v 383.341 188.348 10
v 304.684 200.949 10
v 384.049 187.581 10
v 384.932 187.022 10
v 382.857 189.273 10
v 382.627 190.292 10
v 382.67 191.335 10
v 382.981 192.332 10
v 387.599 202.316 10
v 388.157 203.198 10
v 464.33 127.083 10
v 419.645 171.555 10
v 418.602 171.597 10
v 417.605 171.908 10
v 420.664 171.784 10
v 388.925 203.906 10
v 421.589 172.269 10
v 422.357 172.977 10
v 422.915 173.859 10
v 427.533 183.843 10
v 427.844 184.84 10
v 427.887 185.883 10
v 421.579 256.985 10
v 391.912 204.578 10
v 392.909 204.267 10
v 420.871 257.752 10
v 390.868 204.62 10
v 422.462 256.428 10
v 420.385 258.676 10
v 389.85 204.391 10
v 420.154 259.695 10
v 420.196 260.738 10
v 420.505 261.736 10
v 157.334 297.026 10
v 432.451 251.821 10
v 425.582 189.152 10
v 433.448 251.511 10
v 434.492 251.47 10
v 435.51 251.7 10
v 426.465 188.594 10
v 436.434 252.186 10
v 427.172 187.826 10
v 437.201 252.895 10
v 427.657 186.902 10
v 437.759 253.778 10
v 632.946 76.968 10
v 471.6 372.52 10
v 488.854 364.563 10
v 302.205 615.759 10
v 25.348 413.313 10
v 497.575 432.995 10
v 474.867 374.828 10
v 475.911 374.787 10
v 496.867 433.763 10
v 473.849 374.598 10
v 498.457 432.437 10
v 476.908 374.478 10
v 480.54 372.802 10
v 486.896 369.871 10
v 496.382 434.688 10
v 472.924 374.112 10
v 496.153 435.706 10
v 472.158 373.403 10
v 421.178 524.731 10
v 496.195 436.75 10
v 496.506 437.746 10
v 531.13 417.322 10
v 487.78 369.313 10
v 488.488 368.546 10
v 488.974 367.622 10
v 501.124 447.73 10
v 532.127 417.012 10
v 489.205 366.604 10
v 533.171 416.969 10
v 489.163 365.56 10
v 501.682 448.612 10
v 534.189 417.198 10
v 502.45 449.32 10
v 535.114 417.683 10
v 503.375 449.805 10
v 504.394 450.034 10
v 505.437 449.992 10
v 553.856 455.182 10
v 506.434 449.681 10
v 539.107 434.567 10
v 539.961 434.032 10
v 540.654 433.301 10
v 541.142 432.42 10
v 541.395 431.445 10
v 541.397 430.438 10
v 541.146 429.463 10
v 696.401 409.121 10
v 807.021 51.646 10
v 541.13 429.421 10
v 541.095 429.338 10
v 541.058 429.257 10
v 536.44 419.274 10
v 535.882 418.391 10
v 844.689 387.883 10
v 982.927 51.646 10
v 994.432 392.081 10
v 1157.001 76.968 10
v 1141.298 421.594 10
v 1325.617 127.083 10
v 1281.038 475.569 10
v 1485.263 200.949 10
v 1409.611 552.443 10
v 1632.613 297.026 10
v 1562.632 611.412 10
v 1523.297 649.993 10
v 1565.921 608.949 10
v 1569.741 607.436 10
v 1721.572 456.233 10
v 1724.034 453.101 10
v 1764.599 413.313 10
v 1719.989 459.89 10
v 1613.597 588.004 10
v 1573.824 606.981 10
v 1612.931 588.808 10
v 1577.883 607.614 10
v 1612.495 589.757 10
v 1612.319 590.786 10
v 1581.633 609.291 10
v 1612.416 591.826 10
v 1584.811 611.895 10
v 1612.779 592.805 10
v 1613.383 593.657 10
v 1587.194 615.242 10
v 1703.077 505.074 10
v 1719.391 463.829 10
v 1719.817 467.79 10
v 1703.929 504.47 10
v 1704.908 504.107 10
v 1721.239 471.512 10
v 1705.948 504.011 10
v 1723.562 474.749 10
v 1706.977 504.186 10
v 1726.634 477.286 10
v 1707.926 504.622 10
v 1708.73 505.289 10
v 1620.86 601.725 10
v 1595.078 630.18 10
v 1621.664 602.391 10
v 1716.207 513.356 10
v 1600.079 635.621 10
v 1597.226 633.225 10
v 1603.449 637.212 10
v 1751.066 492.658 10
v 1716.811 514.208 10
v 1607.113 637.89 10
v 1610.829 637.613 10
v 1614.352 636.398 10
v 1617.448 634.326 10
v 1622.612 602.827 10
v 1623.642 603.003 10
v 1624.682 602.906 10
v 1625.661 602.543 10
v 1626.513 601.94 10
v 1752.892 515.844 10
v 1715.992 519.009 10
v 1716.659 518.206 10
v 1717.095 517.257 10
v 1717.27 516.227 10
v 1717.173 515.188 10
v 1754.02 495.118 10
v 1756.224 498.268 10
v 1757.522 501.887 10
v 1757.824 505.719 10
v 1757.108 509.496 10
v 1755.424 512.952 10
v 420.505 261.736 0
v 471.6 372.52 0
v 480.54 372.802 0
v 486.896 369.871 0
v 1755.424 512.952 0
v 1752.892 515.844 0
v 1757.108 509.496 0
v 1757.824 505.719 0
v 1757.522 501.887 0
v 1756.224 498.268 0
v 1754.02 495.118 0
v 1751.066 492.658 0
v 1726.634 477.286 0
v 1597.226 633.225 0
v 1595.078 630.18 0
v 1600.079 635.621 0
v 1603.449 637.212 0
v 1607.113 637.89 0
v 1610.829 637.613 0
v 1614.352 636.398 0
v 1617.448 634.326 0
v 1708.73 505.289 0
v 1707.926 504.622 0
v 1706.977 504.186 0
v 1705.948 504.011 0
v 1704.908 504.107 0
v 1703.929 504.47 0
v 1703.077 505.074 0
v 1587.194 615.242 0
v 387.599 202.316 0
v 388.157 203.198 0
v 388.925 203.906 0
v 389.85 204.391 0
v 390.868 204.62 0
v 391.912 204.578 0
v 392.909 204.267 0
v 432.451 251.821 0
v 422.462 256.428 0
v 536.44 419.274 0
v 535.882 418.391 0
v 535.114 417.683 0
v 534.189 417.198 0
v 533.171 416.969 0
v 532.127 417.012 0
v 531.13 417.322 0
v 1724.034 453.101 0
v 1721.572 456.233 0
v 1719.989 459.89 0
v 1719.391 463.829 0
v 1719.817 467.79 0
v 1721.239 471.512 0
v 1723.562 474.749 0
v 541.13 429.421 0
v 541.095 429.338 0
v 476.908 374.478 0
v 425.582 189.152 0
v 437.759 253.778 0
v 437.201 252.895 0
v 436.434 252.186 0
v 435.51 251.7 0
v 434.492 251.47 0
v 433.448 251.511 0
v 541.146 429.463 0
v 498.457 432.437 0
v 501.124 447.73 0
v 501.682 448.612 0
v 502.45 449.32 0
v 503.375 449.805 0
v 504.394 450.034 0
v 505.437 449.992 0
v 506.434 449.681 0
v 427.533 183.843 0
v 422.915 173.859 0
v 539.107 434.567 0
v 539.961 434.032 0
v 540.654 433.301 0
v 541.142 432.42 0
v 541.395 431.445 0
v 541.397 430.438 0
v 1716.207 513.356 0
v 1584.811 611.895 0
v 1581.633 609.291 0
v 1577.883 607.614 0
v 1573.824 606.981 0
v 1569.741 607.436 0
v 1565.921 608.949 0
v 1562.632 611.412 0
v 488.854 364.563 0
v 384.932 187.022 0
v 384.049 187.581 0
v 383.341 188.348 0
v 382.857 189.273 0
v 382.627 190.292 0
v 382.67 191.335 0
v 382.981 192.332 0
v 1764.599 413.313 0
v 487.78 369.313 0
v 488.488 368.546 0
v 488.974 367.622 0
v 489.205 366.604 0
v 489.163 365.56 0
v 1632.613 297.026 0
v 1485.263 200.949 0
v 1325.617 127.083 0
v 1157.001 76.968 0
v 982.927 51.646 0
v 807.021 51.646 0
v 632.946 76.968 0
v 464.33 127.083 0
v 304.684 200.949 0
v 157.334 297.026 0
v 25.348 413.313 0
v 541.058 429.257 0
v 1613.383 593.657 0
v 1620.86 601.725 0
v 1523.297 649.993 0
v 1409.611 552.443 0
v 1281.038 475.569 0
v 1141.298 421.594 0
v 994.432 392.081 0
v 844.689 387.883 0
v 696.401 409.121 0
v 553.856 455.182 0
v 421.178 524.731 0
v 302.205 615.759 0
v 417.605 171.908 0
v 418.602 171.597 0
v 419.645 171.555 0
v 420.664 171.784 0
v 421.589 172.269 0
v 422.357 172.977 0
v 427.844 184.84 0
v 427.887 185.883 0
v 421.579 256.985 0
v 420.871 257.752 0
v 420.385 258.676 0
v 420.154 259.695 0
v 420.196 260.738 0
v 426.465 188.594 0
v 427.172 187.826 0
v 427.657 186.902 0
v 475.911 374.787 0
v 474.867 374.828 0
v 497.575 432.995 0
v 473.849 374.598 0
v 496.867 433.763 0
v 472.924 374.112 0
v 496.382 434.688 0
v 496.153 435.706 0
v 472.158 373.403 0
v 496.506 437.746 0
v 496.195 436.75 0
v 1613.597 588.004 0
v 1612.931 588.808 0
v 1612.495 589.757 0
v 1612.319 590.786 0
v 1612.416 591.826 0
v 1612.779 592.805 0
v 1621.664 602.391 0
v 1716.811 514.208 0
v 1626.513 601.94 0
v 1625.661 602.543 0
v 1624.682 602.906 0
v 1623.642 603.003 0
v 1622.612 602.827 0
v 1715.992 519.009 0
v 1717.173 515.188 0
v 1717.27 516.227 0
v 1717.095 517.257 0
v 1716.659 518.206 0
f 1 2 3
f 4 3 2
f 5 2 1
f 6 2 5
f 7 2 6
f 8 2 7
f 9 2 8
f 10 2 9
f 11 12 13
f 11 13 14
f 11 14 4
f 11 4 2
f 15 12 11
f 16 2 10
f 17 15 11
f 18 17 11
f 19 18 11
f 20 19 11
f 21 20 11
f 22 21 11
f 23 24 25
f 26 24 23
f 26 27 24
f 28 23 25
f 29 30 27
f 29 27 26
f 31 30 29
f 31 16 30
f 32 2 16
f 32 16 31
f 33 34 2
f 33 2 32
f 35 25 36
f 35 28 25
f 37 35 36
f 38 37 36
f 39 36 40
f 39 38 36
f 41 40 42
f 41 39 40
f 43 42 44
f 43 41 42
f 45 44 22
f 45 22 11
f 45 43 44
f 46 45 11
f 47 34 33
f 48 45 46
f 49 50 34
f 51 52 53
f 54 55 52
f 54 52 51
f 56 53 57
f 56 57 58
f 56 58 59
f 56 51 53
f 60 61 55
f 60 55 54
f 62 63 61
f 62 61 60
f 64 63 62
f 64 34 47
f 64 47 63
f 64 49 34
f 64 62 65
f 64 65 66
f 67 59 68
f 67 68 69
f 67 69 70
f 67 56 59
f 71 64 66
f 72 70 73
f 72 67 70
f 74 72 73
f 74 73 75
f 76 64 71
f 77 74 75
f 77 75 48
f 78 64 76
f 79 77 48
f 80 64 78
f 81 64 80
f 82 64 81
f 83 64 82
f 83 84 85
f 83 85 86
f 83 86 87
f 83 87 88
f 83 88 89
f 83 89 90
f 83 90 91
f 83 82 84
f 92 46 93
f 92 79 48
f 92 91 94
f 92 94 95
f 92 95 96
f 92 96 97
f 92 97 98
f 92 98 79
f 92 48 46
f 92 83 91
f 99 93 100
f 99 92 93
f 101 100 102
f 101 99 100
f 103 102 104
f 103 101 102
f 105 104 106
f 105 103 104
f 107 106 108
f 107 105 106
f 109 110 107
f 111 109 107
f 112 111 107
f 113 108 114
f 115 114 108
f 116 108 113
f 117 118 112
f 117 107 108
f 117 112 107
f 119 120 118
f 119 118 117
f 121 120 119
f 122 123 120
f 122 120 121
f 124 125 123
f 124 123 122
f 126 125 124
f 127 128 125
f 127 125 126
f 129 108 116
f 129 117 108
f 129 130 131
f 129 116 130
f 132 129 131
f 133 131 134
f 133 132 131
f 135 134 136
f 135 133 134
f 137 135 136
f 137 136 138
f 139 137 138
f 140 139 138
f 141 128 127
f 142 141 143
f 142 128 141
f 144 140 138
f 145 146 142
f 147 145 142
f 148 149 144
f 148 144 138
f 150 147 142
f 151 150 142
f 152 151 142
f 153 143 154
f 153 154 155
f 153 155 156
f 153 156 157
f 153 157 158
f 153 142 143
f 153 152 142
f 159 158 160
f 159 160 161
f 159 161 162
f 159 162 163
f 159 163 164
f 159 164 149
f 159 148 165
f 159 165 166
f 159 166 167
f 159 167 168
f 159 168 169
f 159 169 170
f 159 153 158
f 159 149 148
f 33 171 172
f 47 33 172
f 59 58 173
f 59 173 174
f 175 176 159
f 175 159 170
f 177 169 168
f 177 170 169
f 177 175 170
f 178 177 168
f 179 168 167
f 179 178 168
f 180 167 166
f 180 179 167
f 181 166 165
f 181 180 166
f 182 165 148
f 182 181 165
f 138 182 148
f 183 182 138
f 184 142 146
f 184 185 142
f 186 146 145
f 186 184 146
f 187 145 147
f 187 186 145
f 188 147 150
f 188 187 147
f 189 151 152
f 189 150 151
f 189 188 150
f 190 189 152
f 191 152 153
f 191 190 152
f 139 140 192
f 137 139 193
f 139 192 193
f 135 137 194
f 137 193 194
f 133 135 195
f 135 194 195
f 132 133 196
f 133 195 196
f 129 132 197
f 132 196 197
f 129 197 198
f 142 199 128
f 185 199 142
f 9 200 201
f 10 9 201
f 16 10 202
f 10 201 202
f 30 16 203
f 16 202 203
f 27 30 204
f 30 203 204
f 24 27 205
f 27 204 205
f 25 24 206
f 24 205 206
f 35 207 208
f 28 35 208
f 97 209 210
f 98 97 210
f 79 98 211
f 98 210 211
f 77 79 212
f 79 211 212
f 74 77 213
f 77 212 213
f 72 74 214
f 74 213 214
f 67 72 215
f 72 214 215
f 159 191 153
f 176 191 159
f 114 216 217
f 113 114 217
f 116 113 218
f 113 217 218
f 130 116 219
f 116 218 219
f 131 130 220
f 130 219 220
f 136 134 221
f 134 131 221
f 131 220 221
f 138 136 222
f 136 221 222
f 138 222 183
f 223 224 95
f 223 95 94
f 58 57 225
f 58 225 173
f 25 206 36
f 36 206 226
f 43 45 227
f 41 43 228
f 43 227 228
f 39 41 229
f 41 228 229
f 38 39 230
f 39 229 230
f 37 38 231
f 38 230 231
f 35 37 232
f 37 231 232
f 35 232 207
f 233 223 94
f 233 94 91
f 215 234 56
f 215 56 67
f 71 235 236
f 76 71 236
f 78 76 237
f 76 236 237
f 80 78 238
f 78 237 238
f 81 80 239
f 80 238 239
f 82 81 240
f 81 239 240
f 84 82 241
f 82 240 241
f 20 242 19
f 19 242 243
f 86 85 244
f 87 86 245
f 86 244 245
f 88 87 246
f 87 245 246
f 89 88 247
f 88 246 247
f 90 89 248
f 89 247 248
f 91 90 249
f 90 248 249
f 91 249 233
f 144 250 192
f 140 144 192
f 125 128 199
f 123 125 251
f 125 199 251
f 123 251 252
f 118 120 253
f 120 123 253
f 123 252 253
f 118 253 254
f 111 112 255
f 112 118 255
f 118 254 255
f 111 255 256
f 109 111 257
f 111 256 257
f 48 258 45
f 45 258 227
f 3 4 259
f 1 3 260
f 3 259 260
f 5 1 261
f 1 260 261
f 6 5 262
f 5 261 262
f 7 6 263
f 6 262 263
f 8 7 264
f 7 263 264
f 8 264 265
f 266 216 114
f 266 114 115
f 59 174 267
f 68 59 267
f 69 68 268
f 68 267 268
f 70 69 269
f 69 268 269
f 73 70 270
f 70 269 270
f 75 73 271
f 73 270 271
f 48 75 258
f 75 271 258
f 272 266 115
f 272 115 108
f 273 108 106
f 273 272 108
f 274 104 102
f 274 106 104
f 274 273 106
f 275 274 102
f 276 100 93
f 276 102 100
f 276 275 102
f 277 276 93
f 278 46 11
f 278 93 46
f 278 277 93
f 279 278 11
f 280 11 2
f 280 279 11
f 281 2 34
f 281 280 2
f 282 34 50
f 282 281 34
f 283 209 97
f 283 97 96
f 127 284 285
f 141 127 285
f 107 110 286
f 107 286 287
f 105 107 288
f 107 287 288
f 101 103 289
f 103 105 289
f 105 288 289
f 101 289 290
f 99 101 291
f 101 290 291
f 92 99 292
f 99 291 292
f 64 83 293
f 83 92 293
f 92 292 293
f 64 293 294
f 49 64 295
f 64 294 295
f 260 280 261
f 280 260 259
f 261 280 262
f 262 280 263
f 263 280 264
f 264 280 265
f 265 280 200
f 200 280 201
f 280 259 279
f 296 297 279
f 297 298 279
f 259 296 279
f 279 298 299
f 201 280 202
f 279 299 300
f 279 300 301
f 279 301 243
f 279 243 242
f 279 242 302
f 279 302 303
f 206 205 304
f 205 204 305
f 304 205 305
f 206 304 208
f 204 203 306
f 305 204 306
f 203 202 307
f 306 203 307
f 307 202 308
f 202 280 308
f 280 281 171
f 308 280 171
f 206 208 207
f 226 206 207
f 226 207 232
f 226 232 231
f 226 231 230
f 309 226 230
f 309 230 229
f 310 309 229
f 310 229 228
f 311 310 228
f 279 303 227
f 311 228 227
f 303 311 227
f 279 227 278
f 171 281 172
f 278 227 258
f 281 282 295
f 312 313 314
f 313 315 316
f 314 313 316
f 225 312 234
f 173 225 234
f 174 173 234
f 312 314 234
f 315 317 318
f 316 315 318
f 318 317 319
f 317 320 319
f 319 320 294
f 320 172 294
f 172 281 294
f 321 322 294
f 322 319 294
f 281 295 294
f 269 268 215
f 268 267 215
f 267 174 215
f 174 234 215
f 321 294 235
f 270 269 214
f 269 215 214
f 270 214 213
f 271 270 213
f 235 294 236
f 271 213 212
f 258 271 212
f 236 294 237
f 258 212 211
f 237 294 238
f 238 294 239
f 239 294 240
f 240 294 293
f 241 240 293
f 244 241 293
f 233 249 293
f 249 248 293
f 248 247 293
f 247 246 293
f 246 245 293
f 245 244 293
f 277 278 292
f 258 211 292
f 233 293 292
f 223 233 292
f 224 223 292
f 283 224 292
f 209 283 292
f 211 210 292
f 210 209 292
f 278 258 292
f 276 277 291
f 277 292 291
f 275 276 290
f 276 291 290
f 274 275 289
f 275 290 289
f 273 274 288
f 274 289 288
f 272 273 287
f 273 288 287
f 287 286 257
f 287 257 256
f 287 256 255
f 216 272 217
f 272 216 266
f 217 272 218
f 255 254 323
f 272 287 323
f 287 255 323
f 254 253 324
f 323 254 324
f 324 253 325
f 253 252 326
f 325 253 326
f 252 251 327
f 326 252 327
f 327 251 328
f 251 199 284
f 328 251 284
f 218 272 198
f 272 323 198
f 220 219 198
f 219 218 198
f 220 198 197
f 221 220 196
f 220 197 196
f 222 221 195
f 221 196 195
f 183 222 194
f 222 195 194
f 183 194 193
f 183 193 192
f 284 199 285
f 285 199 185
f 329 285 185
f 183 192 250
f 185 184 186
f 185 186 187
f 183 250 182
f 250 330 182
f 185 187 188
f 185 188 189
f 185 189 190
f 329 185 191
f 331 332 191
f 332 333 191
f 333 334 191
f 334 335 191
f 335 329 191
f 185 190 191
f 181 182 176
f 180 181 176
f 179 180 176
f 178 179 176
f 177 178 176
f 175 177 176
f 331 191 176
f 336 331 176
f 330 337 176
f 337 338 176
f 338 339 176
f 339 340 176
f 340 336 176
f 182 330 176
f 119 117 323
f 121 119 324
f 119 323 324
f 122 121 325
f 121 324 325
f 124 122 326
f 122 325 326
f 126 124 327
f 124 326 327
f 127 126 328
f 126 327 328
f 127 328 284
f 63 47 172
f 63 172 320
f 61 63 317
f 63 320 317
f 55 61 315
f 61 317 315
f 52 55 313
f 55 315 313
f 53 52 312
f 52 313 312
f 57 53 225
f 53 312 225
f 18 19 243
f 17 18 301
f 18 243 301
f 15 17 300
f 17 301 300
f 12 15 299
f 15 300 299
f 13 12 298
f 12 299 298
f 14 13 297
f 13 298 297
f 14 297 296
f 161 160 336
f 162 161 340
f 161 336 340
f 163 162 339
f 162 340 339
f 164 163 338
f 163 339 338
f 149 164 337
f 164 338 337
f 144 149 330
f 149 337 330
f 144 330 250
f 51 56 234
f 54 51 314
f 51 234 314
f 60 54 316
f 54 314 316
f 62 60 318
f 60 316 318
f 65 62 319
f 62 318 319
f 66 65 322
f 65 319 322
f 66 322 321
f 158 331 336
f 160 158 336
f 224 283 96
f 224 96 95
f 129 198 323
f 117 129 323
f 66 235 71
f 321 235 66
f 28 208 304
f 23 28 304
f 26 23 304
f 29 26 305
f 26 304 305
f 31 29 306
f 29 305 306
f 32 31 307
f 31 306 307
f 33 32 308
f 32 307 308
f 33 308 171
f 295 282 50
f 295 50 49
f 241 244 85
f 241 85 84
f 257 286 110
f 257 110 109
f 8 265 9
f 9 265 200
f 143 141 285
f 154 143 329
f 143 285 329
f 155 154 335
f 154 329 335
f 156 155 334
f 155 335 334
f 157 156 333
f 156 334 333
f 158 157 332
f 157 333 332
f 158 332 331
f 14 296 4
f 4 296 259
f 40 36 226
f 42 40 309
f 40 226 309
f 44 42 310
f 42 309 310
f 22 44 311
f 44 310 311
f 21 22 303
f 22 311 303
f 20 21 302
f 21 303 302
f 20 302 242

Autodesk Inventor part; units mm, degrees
ref_plane "YZ Plane" through (0, 0, 0) normal (1, 0, 0) x (0, 1, 0)
ref_plane "XZ Plane" through (0, 0, 0) normal (0, 1, 0) x (-1, 0, 0)
ref_plane "XY Plane" through (0, 0, 0) normal (0, 0, 1) x (1, 0, 0)
sketch "CONTOURS" plane through (0, 0, 0) normal (0, 0, 1) x (1, 0, 0)
  line L0 (1957.6292, 879.0874) -> (1973.7702, 879.0874)
  arc A0 (1973.7702, 871.0874) -> (1973.7702, 879.0874) centre (1973.7702, 875.0874) ccw
  line L1 (2395.2631, 344.4855) -> (2395.2631, 361.2856)
  line L2 (2395.2631, 361.2856) -> (2335.4041, 361.2856)
  arc A1 (2327.4041, 361.2857) -> (2335.4041, 361.2856) centre (2331.4041, 361.2856) ccw
  line L3 (2327.4041, 361.2857) -> (2327.4041, 413.0854)
  arc A2 (2046.6196, 767.5507) -> (2327.4041, 413.0854) centre (2780.5524, 1060.4825) ccw
  arc A3 (2046.6196, 767.5507) -> (2038.9046, 766.0679) centre (2042.9046, 766.0679) ccw
  line L4 (2038.9046, 766.0679) -> (2038.9041, 604.8116)
  line L5 (2038.9041, 604.8116) -> (2060.9041, 604.8116)
  arc A4 (2068.9041, 604.8116) -> (2060.9041, 604.8116) centre (2064.9041, 604.8116) ccw
  line L6 (2068.9041, 604.8116) -> (2068.9041, 585.8116)
  arc A5 (2060.9041, 585.8116) -> (2068.9041, 585.8116) centre (2064.9041, 585.8116) ccw
  line L7 (2060.9041, 585.8116) -> (2037.4041, 585.8116)
  line L8 (2037.4041, 585.8116) -> (1996.4234, 585.8116)
  arc A6 (1988.9234, 587.8213) -> (1996.4234, 585.8116) centre (1996.4234, 600.8116) ccw
  line L9 (1988.9234, 587.8213) -> (1963.7631, 602.3475)
  arc A7 (1963.7631, 602.3475) -> (1957.7631, 598.8834) centre (1961.7631, 598.8834) ccw
  line L10 (1957.7631, 598.8834) -> (1957.7631, 403.7398)
  arc A8 (1957.7631, 403.7398) -> (1963.7631, 400.2757) centre (1961.7631, 403.7398) ccw
  line L11 (1963.7631, 400.2757) -> (1988.9234, 414.802)
  arc A9 (1996.4234, 416.8116) -> (1988.9234, 414.802) centre (1996.4234, 401.8116) ccw
  line L12 (1996.4234, 416.8116) -> (2037.4041, 416.8116)
  line L13 (2037.4041, 416.8116) -> (2060.9041, 416.8116)
  arc A10 (2068.9041, 416.8116) -> (2060.9041, 416.8116) centre (2064.9041, 416.8116) ccw
  line L14 (2068.9041, 416.8116) -> (2068.9041, 397.8116)
  arc A11 (2060.9041, 397.8116) -> (2068.9041, 397.8116) centre (2064.9041, 397.8116) ccw
  line L15 (2060.9041, 397.8116) -> (2038.9041, 397.8116)
  line L16 (2038.9041, 397.8116) -> (2038.9041, 210.8117)
  line L17 (2038.9041, 210.8117) -> (2052.4041, 210.8117)
  arc A12 (2052.4041, 202.8117) -> (2052.4041, 210.8117) centre (2052.4041, 206.8117) ccw
  line L18 (2052.4041, 202.8117) -> (2052.4041, 195.3488)
  arc A13 (2052.4041, 195.3488) -> (2327.4041, 47.9742) centre (2799.5688, 1259.2914) ccw
  arc A14 (2327.4041, 39.9742) -> (2327.4041, 47.9742) centre (2327.4041, 43.9742) ccw
  line L19 (2327.4041, 39.9742) -> (2327.4041, 23.2856)
  line L20 (2327.4041, 23.2856) -> (2395.2631, 23.2856)
  line L21 (2395.2631, 23.2856) -> (2395.2631, 40.0855)
  arc A15 (2395.2631, 48.0855) -> (2395.2631, 40.0855) centre (2395.2631, 44.0855) ccw
  line L22 (2395.2631, 48.0855) -> (2411.4041, 48.0855)
  line L23 (2411.4041, 48.0855) -> (2411.4041, 66.0855)
  line L24 (2411.4041, 66.0855) -> (2403.2631, 66.0855)
  arc A16 (2395.2631, 66.0855) -> (2403.2631, 66.0855) centre (2399.2631, 66.0855) ccw
  line L25 (2395.2631, 66.0855) -> (2395.2631, 132.0783)
  line L26 (2395.2631, 132.0783) -> (2373.2631, 132.0783)
  arc A17 (2365.2631, 132.0783) -> (2373.2631, 132.0783) centre (2369.2631, 132.0783) ccw
  line L27 (2365.2631, 132.0783) -> (2365.2631, 148.6501)
  line L28 (2365.2631, 148.6501) -> (2364.8394, 148.4335)
  line L29 (2364.8394, 148.4335) -> (2364.4234, 148.2026)
  line L30 (2364.4234, 148.2026) -> (2339.2631, 133.6763)
  arc A18 (2331.7631, 138.0065) -> (2339.2631, 133.6763) centre (2336.7631, 138.0065) ccw
  line L31 (2331.7631, 138.0065) -> (2331.7631, 246.5646)
  arc A19 (2339.2631, 250.8947) -> (2331.7631, 246.5646) centre (2336.7631, 246.5646) ccw
  line L32 (2339.2631, 250.8947) -> (2364.4234, 236.3684)
  line L33 (2364.4234, 236.3684) -> (2364.8394, 236.1375)
  line L34 (2364.8394, 236.1375) -> (2365.2631, 235.9209)
  line L35 (2365.2631, 235.9209) -> (2365.2631, 252.4928)
  arc A20 (2373.2631, 252.4928) -> (2365.2631, 252.4928) centre (2369.2631, 252.4928) ccw
  line L36 (2373.2631, 252.4928) -> (2395.2631, 252.4928)
  line L37 (2395.2631, 252.4928) -> (2395.2631, 318.4855)
  arc A21 (2403.2631, 318.4855) -> (2395.2631, 318.4855) centre (2399.2631, 318.4855) ccw
  line L38 (2403.2631, 318.4855) -> (2411.4041, 318.4855)
  line L39 (2411.4041, 318.4855) -> (2411.4041, 336.4855)
  line L40 (2411.4041, 336.4855) -> (2395.2631, 336.4855)
  arc A22 (2395.2631, 344.4855) -> (2395.2631, 336.4855) centre (2395.2631, 340.4855) ccw
  line L41 (1973.7702, 871.0874) -> (1973.7702, 854.2874)
  line L42 (1973.7702, 854.2874) -> (2033.6292, 854.2873)
  line L43 (2041.6292, 854.2873) -> (2041.6292, 802.4876)
  arc A23 (2322.4137, 448.0223) -> (2041.6292, 802.4876) centre (1588.4809, 155.0905) ccw
  arc A24 (2322.4137, 448.0223) -> (2330.1287, 449.505) centre (2326.1287, 449.505) ccw
  line L44 (2330.1287, 449.505) -> (2330.1292, 610.7613)
  line L45 (2330.1292, 610.7613) -> (2308.1292, 610.7613)
  arc A25 (2300.1292, 610.7613) -> (2308.1292, 610.7613) centre (2304.1292, 610.7613) ccw
  line L46 (2300.1292, 610.7613) -> (2300.1292, 629.7613)
  arc A26 (2308.1292, 629.7613) -> (2300.1292, 629.7613) centre (2304.1292, 629.7613) ccw
  line L47 (2308.1292, 629.7613) -> (2331.6292, 629.7613)
  line L48 (2331.6292, 629.7613) -> (2372.6099, 629.7613)
  arc A27 (2380.1099, 627.7517) -> (2372.6099, 629.7613) centre (2372.6099, 614.7613) ccw
  line L49 (2380.1099, 627.7517) -> (2405.2702, 613.2254)
  arc A28 (2405.2702, 613.2254) -> (2411.2702, 616.6895) centre (2407.2702, 616.6895) ccw
  line L50 (2411.2702, 616.6895) -> (2411.2702, 811.8331)
  line L51 (2405.2702, 815.2972) -> (2380.1099, 800.7709)
  arc A29 (2372.6099, 798.7613) -> (2380.1099, 800.7709) centre (2372.6099, 813.7613) ccw
  line L52 (2372.6099, 798.7613) -> (2331.6292, 798.7613)
  line L53 (2331.6292, 798.7613) -> (2308.1292, 798.7613)
  arc A30 (2300.1292, 798.7613) -> (2308.1292, 798.7613) centre (2304.1292, 798.7613) ccw
  line L54 (2300.1292, 798.7613) -> (2300.1292, 817.7613)
  arc A31 (2308.1292, 817.7613) -> (2300.1292, 817.7613) centre (2304.1292, 817.7613) ccw
  line L55 (2308.1292, 817.7613) -> (2330.1292, 817.7613)
  line L56 (2330.1292, 817.7613) -> (2330.1292, 1004.7612)
  line L57 (2330.1292, 1004.7612) -> (2316.6292, 1004.7612)
  arc A32 (2316.6292, 1012.7612) -> (2316.6292, 1004.7612) centre (2316.6292, 1008.7612) ccw
  line L58 (2316.6292, 1012.7612) -> (2316.6292, 1020.2242)
  arc A33 (2316.6292, 1020.2242) -> (2041.6292, 1167.5988) centre (1569.4645, -43.7184) ccw
  arc A34 (2041.6292, 1175.5988) -> (2041.6292, 1167.5988) centre (2041.6292, 1171.5988) ccw
  line L59 (2041.6292, 1175.5988) -> (2041.6292, 1192.2873)
  line L60 (2041.6292, 1192.2873) -> (1973.7702, 1192.2873)
  line L61 (1973.7702, 1192.2873) -> (1973.7702, 1175.4874)
  arc A35 (1973.7702, 1167.4874) -> (1973.7702, 1175.4874) centre (1973.7702, 1171.4874) ccw
  line L62 (1973.7702, 1167.4874) -> (1957.6292, 1167.4874)
  line L63 (1957.6292, 1167.4874) -> (1957.6292, 1149.4874)
  line L64 (1957.6292, 1149.4874) -> (1965.7702, 1149.4874)
  arc A36 (1973.7702, 1149.4874) -> (1965.7702, 1149.4874) centre (1969.7702, 1149.4874) ccw
  line L65 (1973.7702, 1149.4874) -> (1973.7702, 1083.4947)
  line L66 (1973.7702, 1083.4947) -> (1995.7702, 1083.4947)
  arc A37 (2003.7702, 1083.4946) -> (1995.7702, 1083.4947) centre (1999.7702, 1083.4947) ccw
  line L67 (2003.7702, 1083.4946) -> (2003.7702, 1066.9228)
  line L68 (2003.7702, 1066.9228) -> (2004.1939, 1067.1394)
  line L69 (2004.1939, 1067.1394) -> (2004.6099, 1067.3703)
  line L70 (2004.6099, 1067.3703) -> (2029.7702, 1081.8966)
  arc A38 (2037.2702, 1077.5665) -> (2029.7702, 1081.8966) centre (2032.2702, 1077.5665) ccw
  line L71 (2037.2702, 1077.5665) -> (2037.2702, 969.0084)
  line L72 (2029.7702, 964.6782) -> (2004.6099, 979.2045)
  line L73 (2004.6099, 979.2045) -> (2004.1939, 979.4354)
  line L74 (2004.1939, 979.4354) -> (2003.7702, 979.652)
  line L75 (2003.7702, 979.652) -> (2003.7702, 963.0802)
  arc A39 (1995.7702, 963.0802) -> (2003.7702, 963.0802) centre (1999.7702, 963.0802) ccw
  arc A40 (2411.2702, 811.8331) -> (2405.2702, 815.2972) centre (2407.2702, 811.8331) ccw
  line L76 (29.0412, 889.8609) -> (69.6135, 929.6413)
  arc A41 (92.1865, 926.768) -> (69.6135, 929.6413) centre (79.765, 919.2877) ccw
  line L77 (92.1865, 926.768) -> (107.0781, 902.0398)
  arc A42 (107.0781, 902.0398) -> (131.8211, 899.605) centre (120.3563, 910.0361) ccw
  line L78 (131.8211, 899.605) -> (252.9238, 1032.7101)
  arc A43 (252.9238, 1032.7101) -> (248.9601, 1056.7052) centre (241.459, 1043.1412) ccw
  line L79 (248.9601, 1056.7052) -> (234.1791, 1064.8793)
  arc A44 (231.0447, 1087.9218) -> (234.1791, 1064.8793) centre (241.1963, 1077.5683) ccw
  line L80 (231.0447, 1087.9218) -> (270.3869, 1126.4961)
  arc A45 (270.3869, 1126.4961) -> (1527.2637, 1126.4961) centre (898.8253, 1743.5906) ccw
  line L81 (1527.2637, 1126.4961) -> (1815.1018, 939.9773)
  arc A46 (29.0412, 889.8609) -> (1815.1018, 939.9773) centre (898.8169, 1743.6721) ccw
  line L82 (1523.2972, 649.9931) -> (1562.6322, 611.4115)
  arc A47 (1562.6322, 611.4115) -> (1587.1937, 615.2422) centre (1573.4858, 622.4771) ccw
  line L83 (1587.1937, 615.2422) -> (1595.0777, 630.18)
  arc A48 (1617.4481, 634.3255) -> (1595.0777, 630.18) centre (1607.9012, 623.4119) ccw
  line L84 (1617.4481, 634.3255) -> (1752.8919, 515.8444)
  arc A49 (1751.0665, 492.6576) -> (1752.8919, 515.8444) centre (1743.3451, 504.9307) ccw
  line L85 (1751.0665, 492.6576) -> (1726.6337, 477.2861)
  arc A50 (1726.6337, 477.2861) -> (1724.034, 453.1009) centre (1734.8877, 464.1665) ccw
  line L86 (1724.034, 453.1009) -> (1764.599, 413.3129)
  arc A51 (25.3482, 413.3129) -> (1764.599, 413.3129) centre (894.9736, 1267.2896) ccw
  line L87 (25.3482, 413.3129) -> (302.205, 615.759)
  arc A52 (302.205, 615.759) -> (1523.2972, 649.9931) centre (894.9664, 1267.2343) ccw
  line L88 (1995.7702, 963.0802) -> (1973.7702, 963.0802)
  line L89 (1973.7702, 963.0802) -> (1973.7702, 897.0874)
  arc A53 (1965.7702, 897.0874) -> (1973.7702, 897.0874) centre (1969.7702, 897.0874) ccw
  line L90 (1965.7702, 897.0874) -> (1957.6292, 897.0874)
  line L91 (1957.6292, 897.0874) -> (1957.6292, 879.0874)
  dimension "d1" = 338
  dimension "d3" = 16.6885
  dimension "d5" = 18
  dimension "d7" = 16.141
  dimension "d9" = 51.7997
  dimension "d11" = 1300.088
  dimension "d13" = 16.7999
sketch "HOLES" plane through (0, 0, 0) normal (0, 0, 1) x (1, 0, 0)
  line L0 (417.6052, 171.9081) -> (384.9317, 187.0224)
  arc A0 (382.9807, 192.3322) -> (384.9317, 187.0224) centre (386.6111, 190.6528) ccw
  line L1 (382.9807, 192.3322) -> (387.5989, 202.3157)
  arc A1 (392.9087, 204.2668) -> (387.5989, 202.3157) centre (391.2293, 200.6364) ccw
  line L2 (392.9087, 204.2668) -> (425.5822, 189.1525)
  arc A2 (427.5332, 183.8427) -> (425.5822, 189.1525) centre (423.9028, 185.5221) ccw
  line L3 (290.0252, 1067.7256) -> (282.3828, 1059.8139)
  arc A3 (276.7268, 1059.716) -> (282.3828, 1059.8139) centre (279.5059, 1062.593) ccw
  line L4 (276.7268, 1059.716) -> (250.8342, 1084.7274)
  arc A4 (250.7363, 1090.3834) -> (250.8342, 1084.7274) centre (253.6132, 1087.6044) ccw
  line L5 (250.7363, 1090.3834) -> (258.3786, 1098.2951)
  arc A5 (264.0347, 1098.393) -> (258.3786, 1098.2951) centre (261.2556, 1095.516) ccw
  line L6 (264.0347, 1098.393) -> (289.9273, 1073.3816)
  arc A6 (290.0252, 1067.7256) -> (289.9273, 1073.3816) centre (287.1482, 1070.5046) ccw
  line L7 (102.1615, 873.2431) -> (94.5191, 865.3315)
  arc A7 (88.8631, 865.2335) -> (94.5191, 865.3315) centre (91.6422, 868.1105) ccw
  line L8 (88.8631, 865.2335) -> (62.9705, 890.245)
  arc A8 (62.8726, 895.901) -> (62.9705, 890.245) centre (65.7496, 893.1219) ccw
  line L9 (62.8726, 895.901) -> (70.515, 903.8126)
  arc A9 (76.171, 903.9105) -> (70.515, 903.8126) centre (73.3919, 901.0336) ccw
  line L10 (488.8536, 364.5631) -> (437.7587, 253.7781)
  arc A10 (102.1615, 873.2431) -> (102.0636, 878.8991) centre (99.2846, 876.0221) ccw
  line L11 (1358.4331, 945.869) -> (1353.2703, 955.5821)
  arc A11 (1353.2703, 955.5821) -> (1347.8609, 957.2368) centre (1349.7382, 953.7047) ccw
  line L12 (1347.8609, 957.2368) -> (1316.0723, 940.3404)
  arc A12 (1316.0723, 940.3404) -> (1314.4176, 934.931) centre (1317.9497, 936.8084) ccw
  line L13 (1314.4176, 934.931) -> (1319.5804, 925.2178)
  arc A13 (1319.5804, 925.2178) -> (1324.9899, 923.5631) centre (1323.1125, 927.0952) ccw
  line L14 (1324.9899, 923.5631) -> (1356.7784, 940.4595)
  arc A14 (1356.7784, 940.4595) -> (1358.4331, 945.869) centre (1354.901, 943.9916) ccw
  line L15 (1441.3284, 696.1636) -> (1446.4912, 686.4505)
  arc A15 (1446.4912, 686.4505) -> (1451.9006, 684.7958) centre (1450.0232, 688.3278) ccw
  line L16 (1451.9006, 684.7958) -> (1483.6892, 701.6922)
  arc A16 (1483.6892, 701.6922) -> (1485.3438, 707.1016) centre (1481.8118, 705.2242) ccw
  line L17 (1485.3438, 707.1016) -> (1480.181, 716.8148)
  arc A17 (1480.181, 716.8148) -> (1474.7716, 718.4695) centre (1476.649, 714.9374) ccw
  line L18 (1474.7716, 718.4695) -> (1442.9831, 701.5731)
  arc A18 (1442.9831, 701.5731) -> (1441.3284, 696.1636) centre (1444.8604, 698.041) ccw
  line L19 (1363.2554, 875.1779) -> (1357.078, 871.8854)
  arc A19 (1357.078, 871.8854) -> (1355.4295, 866.4741) centre (1358.9594, 868.3555) ccw
  line L20 (1355.4295, 866.4741) -> (1412.8118, 758.8114)
  arc A20 (1412.8118, 758.8114) -> (1418.2231, 757.1628) centre (1416.3417, 760.6927) ccw
  line L21 (1418.2231, 757.1628) -> (1427.9304, 762.3366)
  arc A21 (1427.9304, 762.3366) -> (1429.579, 767.7479) centre (1426.049, 765.8666) ccw
  line L22 (1429.579, 767.7479) -> (1372.1967, 875.4107)
  arc A22 (1372.1967, 875.4107) -> (1366.7853, 877.0592) centre (1368.6667, 873.5293) ccw
  line L23 (1366.7853, 877.0592) -> (1363.2554, 875.1779)
  line L24 (1703.0768, 505.0739) -> (1613.5973, 588.0042)
  arc A23 (1613.3826, 593.657) -> (1613.5973, 588.0042) centre (1616.3164, 590.938) ccw
  line L25 (1613.3826, 593.657) -> (1620.8599, 601.7248)
  arc A24 (1626.5127, 601.9395) -> (1620.8599, 601.7248) centre (1623.7937, 599.0058) ccw
  line L26 (1626.5127, 601.9395) -> (1715.9922, 519.0093)
  arc A25 (1716.2069, 513.3565) -> (1715.9922, 519.0093) centre (1713.2731, 516.0755) ccw
  line L27 (1716.2069, 513.3565) -> (1708.7296, 505.2887)
  arc A26 (1703.0768, 505.0739) -> (1708.7296, 505.2887) centre (1705.7958, 508.0077) ccw
  line L28 (541.1297, 429.4206) -> (541.1463, 429.4626)
  arc A27 (541.1463, 429.4626) -> (539.1072, 434.5669) centre (537.4278, 430.9365) ccw
  line L29 (539.1072, 434.5669) -> (506.4339, 449.6811)
  arc A28 (506.4339, 449.6811) -> (501.1241, 447.7301) centre (504.7545, 446.0507) ccw
  line L30 (501.1241, 447.7301) -> (496.5059, 437.7465)
  arc A29 (496.5059, 437.7465) -> (498.4569, 432.4368) centre (500.1363, 436.0672) ccw
  line L31 (498.4569, 432.4368) -> (531.1304, 417.3225)
  arc A30 (531.1304, 417.3225) -> (536.4402, 419.2735) centre (532.8098, 420.9529) ccw
  line L32 (536.4402, 419.2735) -> (541.0584, 429.2571)
  line L33 (541.0584, 429.2571) -> (541.0948, 429.338)
  line L34 (541.0948, 429.338) -> (541.1297, 429.4206)
  line L35 (480.54, 372.8023) -> (486.8965, 369.8706)
  arc A31 (488.8536, 364.5631) -> (486.8965, 369.8706) centre (485.2213, 366.2383) ccw
  arc A32 (432.4511, 251.8211) -> (437.7587, 253.7781) centre (434.1264, 255.4533) ccw
  line L36 (432.4511, 251.8211) -> (422.4623, 256.428)
  arc A33 (420.5053, 261.7355) -> (422.4623, 256.428) centre (424.1376, 260.0603) ccw
  line L37 (420.5053, 261.7355) -> (471.6002, 372.5205)
  arc A34 (476.9077, 374.4775) -> (471.6002, 372.5205) centre (475.2325, 370.8452) ccw
  line L38 (476.9077, 374.4775) -> (480.54, 372.8023)
  line L39 (427.5332, 183.8427) -> (422.915, 173.8591)
  arc A35 (417.6052, 171.9081) -> (422.915, 173.8591) centre (419.2846, 175.5385) ccw
  line L40 (76.171, 903.9105) -> (102.0636, 878.8991)
sketch "LETTERS" plane through (0, 0, 0) normal (0, 0, 1) x (1, 0, 0)
  line L0 (565.2488, 269.5965) -> (565.4715, 269.5068)
  line L1 (565.4715, 269.5068) -> (565.6923, 269.4126)
  line L2 (565.6923, 269.4126) -> (565.9113, 269.314)
  line L3 (565.9113, 269.314) -> (566.1283, 269.2109)
  line L4 (566.1283, 269.2109) -> (566.3432, 269.1036)
  line L5 (566.3432, 269.1036) -> (566.556, 268.9919)
  line L6 (566.556, 268.9919) -> (566.7665, 268.876)
  line L7 (566.7665, 268.876) -> (566.9747, 268.7559)
  line L8 (566.9747, 268.7559) -> (567.1804, 268.6317)
  line L9 (567.1804, 268.6317) -> (567.3837, 268.5035)
  line L10 (567.3837, 268.5035) -> (567.5843, 268.3713)
  line L11 (567.5843, 268.3713) -> (567.7822, 268.2351)
  line L12 (567.7822, 268.2351) -> (567.9773, 268.095)
  line L13 (567.9773, 268.095) -> (568.1695, 267.951)
  line L14 (568.1695, 267.951) -> (568.3587, 267.8033)
  line L15 (568.3587, 267.8033) -> (568.5449, 267.6519)
  line L16 (568.5449, 267.6519) -> (568.7279, 267.4968)
  line L17 (568.7279, 267.4968) -> (568.9076, 267.3381)
  line L18 (568.9076, 267.3381) -> (569.084, 267.1758)
  line L19 (569.084, 267.1758) -> (569.2569, 267.01)
  line L20 (569.2569, 267.01) -> (569.4263, 266.8407)
  line L21 (569.4263, 266.8407) -> (569.5921, 266.6681)
  line L22 (569.5921, 266.6681) -> (569.7542, 266.4921)
  line L23 (569.7542, 266.4921) -> (569.9124, 266.3129)
  line L24 (569.9124, 266.3129) -> (570.0668, 266.1304)
  line L25 (570.0668, 266.1304) -> (570.2171, 265.9448)
  line L26 (570.2171, 265.9448) -> (570.3634, 265.756)
  line L27 (570.3634, 265.756) -> (570.5054, 265.5642)
  line L28 (570.5054, 265.5642) -> (570.6432, 265.3693)
  line L29 (570.6432, 265.3693) -> (570.7767, 265.1716)
  line L30 (570.7767, 265.1716) -> (570.9058, 264.9711)
  line L31 (570.9058, 264.9711) -> (571.0303, 264.7679)
  line L32 (571.0303, 264.7679) -> (571.1503, 264.5622)
  line L33 (571.1503, 264.5622) -> (571.2656, 264.354)
  line L34 (571.2656, 264.354) -> (571.3762, 264.1435)
  line L35 (571.3762, 264.1435) -> (571.482, 263.9307)
  line L36 (571.482, 263.9307) -> (571.583, 263.7158)
  line L37 (571.583, 263.7158) -> (571.679, 263.4989)
  line L38 (571.679, 263.4989) -> (571.77, 263.28)
  line L39 (571.77, 263.28) -> (571.8558, 263.0594)
  line L40 (571.8558, 263.0594) -> (571.9365, 262.8371)
  line L41 (571.9365, 262.8371) -> (572.012, 262.6132)
  line L42 (572.012, 262.6132) -> (572.0821, 262.3878)
  line L43 (572.0821, 262.3878) -> (572.1469, 262.1611)
  line L44 (572.1469, 262.1611) -> (572.2061, 261.9332)
  line L45 (572.2061, 261.9332) -> (572.2599, 261.7041)
  line L46 (572.2599, 261.7041) -> (572.308, 261.474)
  line L47 (572.308, 261.474) -> (572.3504, 261.2429)
  line L48 (572.3504, 261.2429) -> (572.3871, 261.0111)
  line L49 (572.3871, 261.0111) -> (572.4179, 260.7785)
  line L50 (572.4179, 260.7785) -> (572.4428, 260.5454)
  line L51 (572.4428, 260.5454) -> (572.4617, 260.3118)
  line L52 (572.4617, 260.3118) -> (572.4745, 260.0778)
  line L53 (572.4745, 260.0778) -> (572.4811, 259.8435)
  line L54 (572.4811, 259.8435) -> (572.4816, 259.6092)
  line L55 (572.4816, 259.6092) -> (572.4757, 259.3747)
  line L56 (572.4757, 259.3747) -> (572.4635, 259.1404)
  line L57 (572.4635, 259.1404) -> (572.4449, 258.9062)
  line L58 (572.4449, 258.9062) -> (572.4197, 258.6723)
  line L59 (572.4197, 258.6723) -> (572.3879, 258.4388)
  line L60 (572.3879, 258.4388) -> (572.3494, 258.2058)
  line L61 (572.3494, 258.2058) -> (572.3044, 257.9735)
  line L62 (572.3044, 257.9735) -> (572.2529, 257.7421)
  line L63 (572.2529, 257.7421) -> (572.195, 257.5116)
  line L64 (572.195, 257.5116) -> (572.1308, 257.2824)
  line L65 (572.1308, 257.2824) -> (572.0604, 257.0546)
  line L66 (572.0604, 257.0546) -> (571.9839, 256.8283)
  line L67 (571.9839, 256.8283) -> (571.9014, 256.6037)
  line L68 (571.9014, 256.6037) -> (571.8129, 256.381)
  line L69 (571.8129, 256.381) -> (571.7186, 256.1604)
  line L70 (571.7186, 256.1604) -> (571.6186, 255.9421)
  line L71 (571.6186, 255.9421) -> (571.5129, 255.7261)
  line L72 (571.5129, 255.7261) -> (571.4016, 255.5127)
  line L73 (571.4016, 255.5127) -> (571.2849, 255.3021)
  line L74 (571.2849, 255.3021) -> (571.1628, 255.0944)
  line L75 (571.1628, 255.0944) -> (571.0354, 254.8898)
  line L76 (571.0354, 254.8898) -> (570.9028, 254.6885)
  line L77 (570.9028, 254.6885) -> (570.7652, 254.4906)
  line L78 (570.7652, 254.4906) -> (570.6225, 254.2964)
  line L79 (570.6225, 254.2964) -> (570.4749, 254.106)
  line L80 (570.4749, 254.106) -> (570.3225, 253.9195)
  line L81 (570.3225, 253.9195) -> (570.1654, 253.7372)
  line L82 (570.1654, 253.7372) -> (570.0037, 253.5591)
  line L83 (570.0037, 253.5591) -> (569.8374, 253.3856)
  line L84 (569.8374, 253.3856) -> (569.6667, 253.2167)
  line L85 (569.6667, 253.2167) -> (569.4916, 253.0527)
  line L86 (569.4916, 253.0527) -> (569.3123, 252.8937)
  line L87 (569.3123, 252.8937) -> (569.1288, 252.7398)
  line L88 (569.1288, 252.7398) -> (568.9412, 252.5913)
  line L89 (568.9412, 252.5913) -> (568.7497, 252.4483)
  line L90 (568.7497, 252.4483) -> (568.5543, 252.311)
  line L91 (568.5543, 252.311) -> (568.355, 252.1796)
  line L92 (568.355, 252.1796) -> (568.1521, 252.0542)
  line L93 (568.1521, 252.0542) -> (567.9457, 251.9349)
  line L94 (567.9457, 251.9349) -> (567.736, 251.8219)
  line L95 (567.736, 251.8219) -> (567.5231, 251.715)
  line L96 (567.5231, 251.715) -> (567.3073, 251.6145)
  line L97 (567.3073, 251.6145) -> (567.0888, 251.5204)
  line L98 (567.0888, 251.5204) -> (566.8677, 251.4327)
  line L99 (566.8677, 251.4327) -> (566.6443, 251.3516)
  line L100 (566.6443, 251.3516) -> (566.4187, 251.2771)
  line L101 (566.4187, 251.2771) -> (566.1911, 251.2092)
  line L102 (566.1911, 251.2092) -> (565.9618, 251.1481)
  line L103 (565.9618, 251.1481) -> (565.7308, 251.0938)
  line L104 (565.7308, 251.0938) -> (565.4985, 251.0464)
  line L105 (565.4985, 251.0464) -> (565.265, 251.0059)
  line L106 (565.265, 251.0059) -> (565.0305, 250.9724)
  line L107 (565.0305, 250.9724) -> (564.7951, 250.946)
  line L108 (564.7951, 250.946) -> (564.5591, 250.9268)
  line L109 (564.5591, 250.9268) -> (564.3227, 250.9148)
  line L110 (564.3227, 250.9148) -> (564.0861, 250.9101)
  line L111 (564.0861, 250.9101) -> (563.8494, 250.9127)
  line L112 (563.8494, 250.9127) -> (563.6128, 250.9228)
  line L113 (563.6128, 250.9228) -> (563.3766, 250.9404)
  line L114 (563.1409, 250.9656) -> (562.906, 250.9983)
  line L115 (562.906, 250.9983) -> (562.6719, 251.0388)
  line L116 (562.6719, 251.0388) -> (562.439, 251.0871)
  line L117 (562.439, 251.0871) -> (562.2074, 251.1432)
  line L118 (562.2074, 251.1432) -> (561.9772, 251.2072)
  line L119 (561.9772, 251.2072) -> (561.7487, 251.2792)
  line L120 (561.7487, 251.2792) -> (561.5221, 251.3592)
  line L121 (561.5221, 251.3592) -> (561.2975, 251.4473)
  line L122 (561.2975, 251.4473) -> (561.1861, 251.4945)
  line L123 (561.1861, 251.4945) -> (561.0753, 251.5437)
  line L124 (554.4697, 256.2412) -> (554.3188, 256.4266)
  line L125 (554.3188, 256.4266) -> (554.1731, 256.616)
  line L126 (554.1731, 256.616) -> (554.0329, 256.8093)
  line L127 (554.0329, 256.8093) -> (553.898, 257.0063)
  line L128 (553.898, 257.0063) -> (553.7686, 257.2069)
  line L129 (553.7686, 257.2069) -> (553.6447, 257.411)
  line L130 (553.6447, 257.411) -> (553.5265, 257.6182)
  line L131 (553.5265, 257.6182) -> (553.414, 257.8286)
  line L132 (553.414, 257.8286) -> (553.3071, 258.0418)
  line L133 (553.3071, 258.0418) -> (553.2061, 258.2578)
  line L134 (553.2061, 258.2578) -> (553.1109, 258.4764)
  line L135 (553.1109, 258.4764) -> (553.0217, 258.6974)
  line L136 (553.0217, 258.6974) -> (552.9385, 258.9206)
  line L137 (552.9385, 258.9206) -> (552.8613, 259.1459)
  line L138 (552.8613, 259.1459) -> (552.7902, 259.3732)
  line L139 (563.3766, 250.9404) -> (563.1409, 250.9656)
  line L140 (552.7902, 259.3732) -> (552.7253, 259.6021)
  line L141 (552.7253, 259.6021) -> (552.6667, 259.8327)
  line L142 (552.6667, 259.8327) -> (552.6143, 260.0646)
  line L143 (552.6143, 260.0646) -> (552.5684, 260.2978)
  line L144 (552.5684, 260.2978) -> (552.5289, 260.5321)
  line L145 (552.5289, 260.5321) -> (552.4959, 260.7673)
  line L146 (552.4959, 260.7673) -> (552.4694, 261.0032)
  line L147 (552.4694, 261.0032) -> (552.4496, 261.2397)
  line L148 (552.4496, 261.2397) -> (552.4365, 261.4766)
  line L149 (552.4365, 261.4766) -> (552.4301, 261.7138)
  line L150 (552.4301, 261.7138) -> (552.4305, 261.9511)
  line L151 (552.4305, 261.9511) -> (552.4379, 262.1882)
  line L152 (552.4379, 262.1882) -> (552.4522, 262.4251)
  line L153 (552.4522, 262.4251) -> (552.4735, 262.6616)
  line L154 (552.4735, 262.6616) -> (552.5018, 262.8975)
  line L155 (552.5018, 262.8975) -> (552.5373, 263.1327)
  line L156 (552.5373, 263.1327) -> (552.5801, 263.3669)
  line L157 (552.5801, 263.3669) -> (552.63, 263.6001)
  line L158 (552.63, 263.6001) -> (552.6871, 263.832)
  line L159 (552.6871, 263.832) -> (552.7512, 264.0625)
  line L160 (552.7512, 264.0625) -> (552.8221, 264.2913)
  line L161 (552.8221, 264.2913) -> (552.8997, 264.5184)
  line L162 (552.8997, 264.5184) -> (552.9838, 264.7436)
  line L163 (552.9838, 264.7436) -> (553.0744, 264.9667)
  line L164 (553.0744, 264.9667) -> (553.1713, 265.1875)
  line L165 (553.1713, 265.1875) -> (553.2743, 265.4059)
  line L166 (553.2743, 265.4059) -> (553.3833, 265.6216)
  line L167 (553.3833, 265.6216) -> (553.4982, 265.8346)
  line L168 (553.4982, 265.8346) -> (553.6188, 266.0446)
  line L169 (553.6188, 266.0446) -> (553.745, 266.2515)
  line L170 (553.745, 266.2515) -> (553.8766, 266.4551)
  line L171 (553.8766, 266.4551) -> (554.0134, 266.6552)
  line L172 (554.0134, 266.6552) -> (554.1555, 266.8517)
  line L173 (554.1555, 266.8517) -> (554.3025, 267.0444)
  line L174 (554.3025, 267.0444) -> (554.4545, 267.2331)
  line L175 (554.4545, 267.2331) -> (554.6111, 267.4177)
  line L176 (554.6111, 267.4177) -> (554.7724, 267.598)
  line L177 (554.7724, 267.598) -> (554.9381, 267.7738)
  line L178 (554.9381, 267.7738) -> (555.108, 267.945)
  line L179 (555.108, 267.945) -> (555.2822, 268.1113)
  line L180 (555.2822, 268.1113) -> (555.4604, 268.2726)
  line L181 (555.4604, 268.2726) -> (555.6425, 268.4288)
  line L182 (555.6425, 268.4288) -> (555.8283, 268.5797)
  line L183 (555.8283, 268.5797) -> (556.0177, 268.725)
  line L184 (556.0177, 268.725) -> (556.2106, 268.8647)
  line L185 (556.2106, 268.8647) -> (556.4068, 268.9986)
  line L186 (556.4068, 268.9986) -> (556.6061, 269.1264)
  line L187 (556.6061, 269.1264) -> (556.8085, 269.2481)
  line L188 (556.8085, 269.2481) -> (557.0138, 269.3634)
  line L189 (557.0138, 269.3634) -> (557.2219, 269.4722)
  line L190 (557.2219, 269.4722) -> (557.4326, 269.5746)
  line L191 (557.4326, 269.5746) -> (557.6458, 269.6706)
  line L192 (557.6458, 269.6706) -> (557.8613, 269.7602)
  line L193 (557.8613, 269.7602) -> (558.0792, 269.8435)
  line L194 (558.0792, 269.8435) -> (558.2991, 269.9206)
  line L195 (558.2991, 269.9206) -> (558.521, 269.9914)
  line L196 (558.521, 269.9914) -> (558.7448, 270.0562)
  line L197 (558.7448, 270.0562) -> (558.9703, 270.1148)
  line L198 (558.9703, 270.1148) -> (559.1974, 270.1675)
  line L199 (559.1974, 270.1675) -> (559.426, 270.2141)
  line L200 (559.426, 270.2141) -> (559.6559, 270.2548)
  line L201 (559.6559, 270.2548) -> (559.8871, 270.2897)
  line L202 (559.8871, 270.2897) -> (560.1194, 270.3188)
  line L203 (560.1194, 270.3188) -> (560.3526, 270.342)
  line L204 (560.3526, 270.342) -> (560.5867, 270.3596)
  line L205 (560.5867, 270.3596) -> (560.8215, 270.3716)
  line L206 (560.8215, 270.3716) -> (561.0569, 270.3779)
  line L207 (561.0569, 270.3779) -> (561.2927, 270.3787)
  line L208 (561.2927, 270.3787) -> (561.5289, 270.374)
  line L209 (561.5289, 270.374) -> (561.7653, 270.3638)
  line L210 (561.7653, 270.3638) -> (562.0017, 270.3483)
  line L211 (562.0017, 270.3483) -> (562.2381, 270.3274)
  line L212 (562.2381, 270.3274) -> (562.4743, 270.3013)
  line L213 (562.4743, 270.3013) -> (562.7102, 270.27)
  line L214 (562.7102, 270.27) -> (562.9457, 270.2335)
  line L215 (562.9457, 270.2335) -> (563.1806, 270.1919)
  line L216 (563.1806, 270.1919) -> (563.4148, 270.1452)
  line L217 (563.4148, 270.1452) -> (563.6483, 270.0936)
  line L218 (563.6483, 270.0936) -> (563.8807, 270.037)
  line L219 (563.8807, 270.037) -> (564.1121, 269.9755)
  line L220 (564.1121, 269.9755) -> (564.3423, 269.9091)
  line L221 (564.3423, 269.9091) -> (564.5711, 269.838)
  line L222 (564.5711, 269.838) -> (564.7986, 269.7622)
  line L223 (564.7986, 269.7622) -> (565.0245, 269.6817)
  line L224 (565.0245, 269.6817) -> (565.2488, 269.5965)
extrude "Extrusion1" add sketch "CONTOURS" along normal blind 10 contours L82 A47 L83 A48 L84 A49 L85 A50 L86 A51 L87 A52
extrude "Extrusion2" cut sketch "HOLES" along normal blind 18 contours L0 A0 L1 A1 L2 A2 L39 A35 | L10 A32 L36 A33 L37 A34 L38 L35 A31 | L24 A23 L25 A24 L26 A25 L27 A26 | L34 L33 L32 A30 L31 A29 L30 A28 L29 A27 L28
properties part number "Platform C1" material "Wood (Birch)"
